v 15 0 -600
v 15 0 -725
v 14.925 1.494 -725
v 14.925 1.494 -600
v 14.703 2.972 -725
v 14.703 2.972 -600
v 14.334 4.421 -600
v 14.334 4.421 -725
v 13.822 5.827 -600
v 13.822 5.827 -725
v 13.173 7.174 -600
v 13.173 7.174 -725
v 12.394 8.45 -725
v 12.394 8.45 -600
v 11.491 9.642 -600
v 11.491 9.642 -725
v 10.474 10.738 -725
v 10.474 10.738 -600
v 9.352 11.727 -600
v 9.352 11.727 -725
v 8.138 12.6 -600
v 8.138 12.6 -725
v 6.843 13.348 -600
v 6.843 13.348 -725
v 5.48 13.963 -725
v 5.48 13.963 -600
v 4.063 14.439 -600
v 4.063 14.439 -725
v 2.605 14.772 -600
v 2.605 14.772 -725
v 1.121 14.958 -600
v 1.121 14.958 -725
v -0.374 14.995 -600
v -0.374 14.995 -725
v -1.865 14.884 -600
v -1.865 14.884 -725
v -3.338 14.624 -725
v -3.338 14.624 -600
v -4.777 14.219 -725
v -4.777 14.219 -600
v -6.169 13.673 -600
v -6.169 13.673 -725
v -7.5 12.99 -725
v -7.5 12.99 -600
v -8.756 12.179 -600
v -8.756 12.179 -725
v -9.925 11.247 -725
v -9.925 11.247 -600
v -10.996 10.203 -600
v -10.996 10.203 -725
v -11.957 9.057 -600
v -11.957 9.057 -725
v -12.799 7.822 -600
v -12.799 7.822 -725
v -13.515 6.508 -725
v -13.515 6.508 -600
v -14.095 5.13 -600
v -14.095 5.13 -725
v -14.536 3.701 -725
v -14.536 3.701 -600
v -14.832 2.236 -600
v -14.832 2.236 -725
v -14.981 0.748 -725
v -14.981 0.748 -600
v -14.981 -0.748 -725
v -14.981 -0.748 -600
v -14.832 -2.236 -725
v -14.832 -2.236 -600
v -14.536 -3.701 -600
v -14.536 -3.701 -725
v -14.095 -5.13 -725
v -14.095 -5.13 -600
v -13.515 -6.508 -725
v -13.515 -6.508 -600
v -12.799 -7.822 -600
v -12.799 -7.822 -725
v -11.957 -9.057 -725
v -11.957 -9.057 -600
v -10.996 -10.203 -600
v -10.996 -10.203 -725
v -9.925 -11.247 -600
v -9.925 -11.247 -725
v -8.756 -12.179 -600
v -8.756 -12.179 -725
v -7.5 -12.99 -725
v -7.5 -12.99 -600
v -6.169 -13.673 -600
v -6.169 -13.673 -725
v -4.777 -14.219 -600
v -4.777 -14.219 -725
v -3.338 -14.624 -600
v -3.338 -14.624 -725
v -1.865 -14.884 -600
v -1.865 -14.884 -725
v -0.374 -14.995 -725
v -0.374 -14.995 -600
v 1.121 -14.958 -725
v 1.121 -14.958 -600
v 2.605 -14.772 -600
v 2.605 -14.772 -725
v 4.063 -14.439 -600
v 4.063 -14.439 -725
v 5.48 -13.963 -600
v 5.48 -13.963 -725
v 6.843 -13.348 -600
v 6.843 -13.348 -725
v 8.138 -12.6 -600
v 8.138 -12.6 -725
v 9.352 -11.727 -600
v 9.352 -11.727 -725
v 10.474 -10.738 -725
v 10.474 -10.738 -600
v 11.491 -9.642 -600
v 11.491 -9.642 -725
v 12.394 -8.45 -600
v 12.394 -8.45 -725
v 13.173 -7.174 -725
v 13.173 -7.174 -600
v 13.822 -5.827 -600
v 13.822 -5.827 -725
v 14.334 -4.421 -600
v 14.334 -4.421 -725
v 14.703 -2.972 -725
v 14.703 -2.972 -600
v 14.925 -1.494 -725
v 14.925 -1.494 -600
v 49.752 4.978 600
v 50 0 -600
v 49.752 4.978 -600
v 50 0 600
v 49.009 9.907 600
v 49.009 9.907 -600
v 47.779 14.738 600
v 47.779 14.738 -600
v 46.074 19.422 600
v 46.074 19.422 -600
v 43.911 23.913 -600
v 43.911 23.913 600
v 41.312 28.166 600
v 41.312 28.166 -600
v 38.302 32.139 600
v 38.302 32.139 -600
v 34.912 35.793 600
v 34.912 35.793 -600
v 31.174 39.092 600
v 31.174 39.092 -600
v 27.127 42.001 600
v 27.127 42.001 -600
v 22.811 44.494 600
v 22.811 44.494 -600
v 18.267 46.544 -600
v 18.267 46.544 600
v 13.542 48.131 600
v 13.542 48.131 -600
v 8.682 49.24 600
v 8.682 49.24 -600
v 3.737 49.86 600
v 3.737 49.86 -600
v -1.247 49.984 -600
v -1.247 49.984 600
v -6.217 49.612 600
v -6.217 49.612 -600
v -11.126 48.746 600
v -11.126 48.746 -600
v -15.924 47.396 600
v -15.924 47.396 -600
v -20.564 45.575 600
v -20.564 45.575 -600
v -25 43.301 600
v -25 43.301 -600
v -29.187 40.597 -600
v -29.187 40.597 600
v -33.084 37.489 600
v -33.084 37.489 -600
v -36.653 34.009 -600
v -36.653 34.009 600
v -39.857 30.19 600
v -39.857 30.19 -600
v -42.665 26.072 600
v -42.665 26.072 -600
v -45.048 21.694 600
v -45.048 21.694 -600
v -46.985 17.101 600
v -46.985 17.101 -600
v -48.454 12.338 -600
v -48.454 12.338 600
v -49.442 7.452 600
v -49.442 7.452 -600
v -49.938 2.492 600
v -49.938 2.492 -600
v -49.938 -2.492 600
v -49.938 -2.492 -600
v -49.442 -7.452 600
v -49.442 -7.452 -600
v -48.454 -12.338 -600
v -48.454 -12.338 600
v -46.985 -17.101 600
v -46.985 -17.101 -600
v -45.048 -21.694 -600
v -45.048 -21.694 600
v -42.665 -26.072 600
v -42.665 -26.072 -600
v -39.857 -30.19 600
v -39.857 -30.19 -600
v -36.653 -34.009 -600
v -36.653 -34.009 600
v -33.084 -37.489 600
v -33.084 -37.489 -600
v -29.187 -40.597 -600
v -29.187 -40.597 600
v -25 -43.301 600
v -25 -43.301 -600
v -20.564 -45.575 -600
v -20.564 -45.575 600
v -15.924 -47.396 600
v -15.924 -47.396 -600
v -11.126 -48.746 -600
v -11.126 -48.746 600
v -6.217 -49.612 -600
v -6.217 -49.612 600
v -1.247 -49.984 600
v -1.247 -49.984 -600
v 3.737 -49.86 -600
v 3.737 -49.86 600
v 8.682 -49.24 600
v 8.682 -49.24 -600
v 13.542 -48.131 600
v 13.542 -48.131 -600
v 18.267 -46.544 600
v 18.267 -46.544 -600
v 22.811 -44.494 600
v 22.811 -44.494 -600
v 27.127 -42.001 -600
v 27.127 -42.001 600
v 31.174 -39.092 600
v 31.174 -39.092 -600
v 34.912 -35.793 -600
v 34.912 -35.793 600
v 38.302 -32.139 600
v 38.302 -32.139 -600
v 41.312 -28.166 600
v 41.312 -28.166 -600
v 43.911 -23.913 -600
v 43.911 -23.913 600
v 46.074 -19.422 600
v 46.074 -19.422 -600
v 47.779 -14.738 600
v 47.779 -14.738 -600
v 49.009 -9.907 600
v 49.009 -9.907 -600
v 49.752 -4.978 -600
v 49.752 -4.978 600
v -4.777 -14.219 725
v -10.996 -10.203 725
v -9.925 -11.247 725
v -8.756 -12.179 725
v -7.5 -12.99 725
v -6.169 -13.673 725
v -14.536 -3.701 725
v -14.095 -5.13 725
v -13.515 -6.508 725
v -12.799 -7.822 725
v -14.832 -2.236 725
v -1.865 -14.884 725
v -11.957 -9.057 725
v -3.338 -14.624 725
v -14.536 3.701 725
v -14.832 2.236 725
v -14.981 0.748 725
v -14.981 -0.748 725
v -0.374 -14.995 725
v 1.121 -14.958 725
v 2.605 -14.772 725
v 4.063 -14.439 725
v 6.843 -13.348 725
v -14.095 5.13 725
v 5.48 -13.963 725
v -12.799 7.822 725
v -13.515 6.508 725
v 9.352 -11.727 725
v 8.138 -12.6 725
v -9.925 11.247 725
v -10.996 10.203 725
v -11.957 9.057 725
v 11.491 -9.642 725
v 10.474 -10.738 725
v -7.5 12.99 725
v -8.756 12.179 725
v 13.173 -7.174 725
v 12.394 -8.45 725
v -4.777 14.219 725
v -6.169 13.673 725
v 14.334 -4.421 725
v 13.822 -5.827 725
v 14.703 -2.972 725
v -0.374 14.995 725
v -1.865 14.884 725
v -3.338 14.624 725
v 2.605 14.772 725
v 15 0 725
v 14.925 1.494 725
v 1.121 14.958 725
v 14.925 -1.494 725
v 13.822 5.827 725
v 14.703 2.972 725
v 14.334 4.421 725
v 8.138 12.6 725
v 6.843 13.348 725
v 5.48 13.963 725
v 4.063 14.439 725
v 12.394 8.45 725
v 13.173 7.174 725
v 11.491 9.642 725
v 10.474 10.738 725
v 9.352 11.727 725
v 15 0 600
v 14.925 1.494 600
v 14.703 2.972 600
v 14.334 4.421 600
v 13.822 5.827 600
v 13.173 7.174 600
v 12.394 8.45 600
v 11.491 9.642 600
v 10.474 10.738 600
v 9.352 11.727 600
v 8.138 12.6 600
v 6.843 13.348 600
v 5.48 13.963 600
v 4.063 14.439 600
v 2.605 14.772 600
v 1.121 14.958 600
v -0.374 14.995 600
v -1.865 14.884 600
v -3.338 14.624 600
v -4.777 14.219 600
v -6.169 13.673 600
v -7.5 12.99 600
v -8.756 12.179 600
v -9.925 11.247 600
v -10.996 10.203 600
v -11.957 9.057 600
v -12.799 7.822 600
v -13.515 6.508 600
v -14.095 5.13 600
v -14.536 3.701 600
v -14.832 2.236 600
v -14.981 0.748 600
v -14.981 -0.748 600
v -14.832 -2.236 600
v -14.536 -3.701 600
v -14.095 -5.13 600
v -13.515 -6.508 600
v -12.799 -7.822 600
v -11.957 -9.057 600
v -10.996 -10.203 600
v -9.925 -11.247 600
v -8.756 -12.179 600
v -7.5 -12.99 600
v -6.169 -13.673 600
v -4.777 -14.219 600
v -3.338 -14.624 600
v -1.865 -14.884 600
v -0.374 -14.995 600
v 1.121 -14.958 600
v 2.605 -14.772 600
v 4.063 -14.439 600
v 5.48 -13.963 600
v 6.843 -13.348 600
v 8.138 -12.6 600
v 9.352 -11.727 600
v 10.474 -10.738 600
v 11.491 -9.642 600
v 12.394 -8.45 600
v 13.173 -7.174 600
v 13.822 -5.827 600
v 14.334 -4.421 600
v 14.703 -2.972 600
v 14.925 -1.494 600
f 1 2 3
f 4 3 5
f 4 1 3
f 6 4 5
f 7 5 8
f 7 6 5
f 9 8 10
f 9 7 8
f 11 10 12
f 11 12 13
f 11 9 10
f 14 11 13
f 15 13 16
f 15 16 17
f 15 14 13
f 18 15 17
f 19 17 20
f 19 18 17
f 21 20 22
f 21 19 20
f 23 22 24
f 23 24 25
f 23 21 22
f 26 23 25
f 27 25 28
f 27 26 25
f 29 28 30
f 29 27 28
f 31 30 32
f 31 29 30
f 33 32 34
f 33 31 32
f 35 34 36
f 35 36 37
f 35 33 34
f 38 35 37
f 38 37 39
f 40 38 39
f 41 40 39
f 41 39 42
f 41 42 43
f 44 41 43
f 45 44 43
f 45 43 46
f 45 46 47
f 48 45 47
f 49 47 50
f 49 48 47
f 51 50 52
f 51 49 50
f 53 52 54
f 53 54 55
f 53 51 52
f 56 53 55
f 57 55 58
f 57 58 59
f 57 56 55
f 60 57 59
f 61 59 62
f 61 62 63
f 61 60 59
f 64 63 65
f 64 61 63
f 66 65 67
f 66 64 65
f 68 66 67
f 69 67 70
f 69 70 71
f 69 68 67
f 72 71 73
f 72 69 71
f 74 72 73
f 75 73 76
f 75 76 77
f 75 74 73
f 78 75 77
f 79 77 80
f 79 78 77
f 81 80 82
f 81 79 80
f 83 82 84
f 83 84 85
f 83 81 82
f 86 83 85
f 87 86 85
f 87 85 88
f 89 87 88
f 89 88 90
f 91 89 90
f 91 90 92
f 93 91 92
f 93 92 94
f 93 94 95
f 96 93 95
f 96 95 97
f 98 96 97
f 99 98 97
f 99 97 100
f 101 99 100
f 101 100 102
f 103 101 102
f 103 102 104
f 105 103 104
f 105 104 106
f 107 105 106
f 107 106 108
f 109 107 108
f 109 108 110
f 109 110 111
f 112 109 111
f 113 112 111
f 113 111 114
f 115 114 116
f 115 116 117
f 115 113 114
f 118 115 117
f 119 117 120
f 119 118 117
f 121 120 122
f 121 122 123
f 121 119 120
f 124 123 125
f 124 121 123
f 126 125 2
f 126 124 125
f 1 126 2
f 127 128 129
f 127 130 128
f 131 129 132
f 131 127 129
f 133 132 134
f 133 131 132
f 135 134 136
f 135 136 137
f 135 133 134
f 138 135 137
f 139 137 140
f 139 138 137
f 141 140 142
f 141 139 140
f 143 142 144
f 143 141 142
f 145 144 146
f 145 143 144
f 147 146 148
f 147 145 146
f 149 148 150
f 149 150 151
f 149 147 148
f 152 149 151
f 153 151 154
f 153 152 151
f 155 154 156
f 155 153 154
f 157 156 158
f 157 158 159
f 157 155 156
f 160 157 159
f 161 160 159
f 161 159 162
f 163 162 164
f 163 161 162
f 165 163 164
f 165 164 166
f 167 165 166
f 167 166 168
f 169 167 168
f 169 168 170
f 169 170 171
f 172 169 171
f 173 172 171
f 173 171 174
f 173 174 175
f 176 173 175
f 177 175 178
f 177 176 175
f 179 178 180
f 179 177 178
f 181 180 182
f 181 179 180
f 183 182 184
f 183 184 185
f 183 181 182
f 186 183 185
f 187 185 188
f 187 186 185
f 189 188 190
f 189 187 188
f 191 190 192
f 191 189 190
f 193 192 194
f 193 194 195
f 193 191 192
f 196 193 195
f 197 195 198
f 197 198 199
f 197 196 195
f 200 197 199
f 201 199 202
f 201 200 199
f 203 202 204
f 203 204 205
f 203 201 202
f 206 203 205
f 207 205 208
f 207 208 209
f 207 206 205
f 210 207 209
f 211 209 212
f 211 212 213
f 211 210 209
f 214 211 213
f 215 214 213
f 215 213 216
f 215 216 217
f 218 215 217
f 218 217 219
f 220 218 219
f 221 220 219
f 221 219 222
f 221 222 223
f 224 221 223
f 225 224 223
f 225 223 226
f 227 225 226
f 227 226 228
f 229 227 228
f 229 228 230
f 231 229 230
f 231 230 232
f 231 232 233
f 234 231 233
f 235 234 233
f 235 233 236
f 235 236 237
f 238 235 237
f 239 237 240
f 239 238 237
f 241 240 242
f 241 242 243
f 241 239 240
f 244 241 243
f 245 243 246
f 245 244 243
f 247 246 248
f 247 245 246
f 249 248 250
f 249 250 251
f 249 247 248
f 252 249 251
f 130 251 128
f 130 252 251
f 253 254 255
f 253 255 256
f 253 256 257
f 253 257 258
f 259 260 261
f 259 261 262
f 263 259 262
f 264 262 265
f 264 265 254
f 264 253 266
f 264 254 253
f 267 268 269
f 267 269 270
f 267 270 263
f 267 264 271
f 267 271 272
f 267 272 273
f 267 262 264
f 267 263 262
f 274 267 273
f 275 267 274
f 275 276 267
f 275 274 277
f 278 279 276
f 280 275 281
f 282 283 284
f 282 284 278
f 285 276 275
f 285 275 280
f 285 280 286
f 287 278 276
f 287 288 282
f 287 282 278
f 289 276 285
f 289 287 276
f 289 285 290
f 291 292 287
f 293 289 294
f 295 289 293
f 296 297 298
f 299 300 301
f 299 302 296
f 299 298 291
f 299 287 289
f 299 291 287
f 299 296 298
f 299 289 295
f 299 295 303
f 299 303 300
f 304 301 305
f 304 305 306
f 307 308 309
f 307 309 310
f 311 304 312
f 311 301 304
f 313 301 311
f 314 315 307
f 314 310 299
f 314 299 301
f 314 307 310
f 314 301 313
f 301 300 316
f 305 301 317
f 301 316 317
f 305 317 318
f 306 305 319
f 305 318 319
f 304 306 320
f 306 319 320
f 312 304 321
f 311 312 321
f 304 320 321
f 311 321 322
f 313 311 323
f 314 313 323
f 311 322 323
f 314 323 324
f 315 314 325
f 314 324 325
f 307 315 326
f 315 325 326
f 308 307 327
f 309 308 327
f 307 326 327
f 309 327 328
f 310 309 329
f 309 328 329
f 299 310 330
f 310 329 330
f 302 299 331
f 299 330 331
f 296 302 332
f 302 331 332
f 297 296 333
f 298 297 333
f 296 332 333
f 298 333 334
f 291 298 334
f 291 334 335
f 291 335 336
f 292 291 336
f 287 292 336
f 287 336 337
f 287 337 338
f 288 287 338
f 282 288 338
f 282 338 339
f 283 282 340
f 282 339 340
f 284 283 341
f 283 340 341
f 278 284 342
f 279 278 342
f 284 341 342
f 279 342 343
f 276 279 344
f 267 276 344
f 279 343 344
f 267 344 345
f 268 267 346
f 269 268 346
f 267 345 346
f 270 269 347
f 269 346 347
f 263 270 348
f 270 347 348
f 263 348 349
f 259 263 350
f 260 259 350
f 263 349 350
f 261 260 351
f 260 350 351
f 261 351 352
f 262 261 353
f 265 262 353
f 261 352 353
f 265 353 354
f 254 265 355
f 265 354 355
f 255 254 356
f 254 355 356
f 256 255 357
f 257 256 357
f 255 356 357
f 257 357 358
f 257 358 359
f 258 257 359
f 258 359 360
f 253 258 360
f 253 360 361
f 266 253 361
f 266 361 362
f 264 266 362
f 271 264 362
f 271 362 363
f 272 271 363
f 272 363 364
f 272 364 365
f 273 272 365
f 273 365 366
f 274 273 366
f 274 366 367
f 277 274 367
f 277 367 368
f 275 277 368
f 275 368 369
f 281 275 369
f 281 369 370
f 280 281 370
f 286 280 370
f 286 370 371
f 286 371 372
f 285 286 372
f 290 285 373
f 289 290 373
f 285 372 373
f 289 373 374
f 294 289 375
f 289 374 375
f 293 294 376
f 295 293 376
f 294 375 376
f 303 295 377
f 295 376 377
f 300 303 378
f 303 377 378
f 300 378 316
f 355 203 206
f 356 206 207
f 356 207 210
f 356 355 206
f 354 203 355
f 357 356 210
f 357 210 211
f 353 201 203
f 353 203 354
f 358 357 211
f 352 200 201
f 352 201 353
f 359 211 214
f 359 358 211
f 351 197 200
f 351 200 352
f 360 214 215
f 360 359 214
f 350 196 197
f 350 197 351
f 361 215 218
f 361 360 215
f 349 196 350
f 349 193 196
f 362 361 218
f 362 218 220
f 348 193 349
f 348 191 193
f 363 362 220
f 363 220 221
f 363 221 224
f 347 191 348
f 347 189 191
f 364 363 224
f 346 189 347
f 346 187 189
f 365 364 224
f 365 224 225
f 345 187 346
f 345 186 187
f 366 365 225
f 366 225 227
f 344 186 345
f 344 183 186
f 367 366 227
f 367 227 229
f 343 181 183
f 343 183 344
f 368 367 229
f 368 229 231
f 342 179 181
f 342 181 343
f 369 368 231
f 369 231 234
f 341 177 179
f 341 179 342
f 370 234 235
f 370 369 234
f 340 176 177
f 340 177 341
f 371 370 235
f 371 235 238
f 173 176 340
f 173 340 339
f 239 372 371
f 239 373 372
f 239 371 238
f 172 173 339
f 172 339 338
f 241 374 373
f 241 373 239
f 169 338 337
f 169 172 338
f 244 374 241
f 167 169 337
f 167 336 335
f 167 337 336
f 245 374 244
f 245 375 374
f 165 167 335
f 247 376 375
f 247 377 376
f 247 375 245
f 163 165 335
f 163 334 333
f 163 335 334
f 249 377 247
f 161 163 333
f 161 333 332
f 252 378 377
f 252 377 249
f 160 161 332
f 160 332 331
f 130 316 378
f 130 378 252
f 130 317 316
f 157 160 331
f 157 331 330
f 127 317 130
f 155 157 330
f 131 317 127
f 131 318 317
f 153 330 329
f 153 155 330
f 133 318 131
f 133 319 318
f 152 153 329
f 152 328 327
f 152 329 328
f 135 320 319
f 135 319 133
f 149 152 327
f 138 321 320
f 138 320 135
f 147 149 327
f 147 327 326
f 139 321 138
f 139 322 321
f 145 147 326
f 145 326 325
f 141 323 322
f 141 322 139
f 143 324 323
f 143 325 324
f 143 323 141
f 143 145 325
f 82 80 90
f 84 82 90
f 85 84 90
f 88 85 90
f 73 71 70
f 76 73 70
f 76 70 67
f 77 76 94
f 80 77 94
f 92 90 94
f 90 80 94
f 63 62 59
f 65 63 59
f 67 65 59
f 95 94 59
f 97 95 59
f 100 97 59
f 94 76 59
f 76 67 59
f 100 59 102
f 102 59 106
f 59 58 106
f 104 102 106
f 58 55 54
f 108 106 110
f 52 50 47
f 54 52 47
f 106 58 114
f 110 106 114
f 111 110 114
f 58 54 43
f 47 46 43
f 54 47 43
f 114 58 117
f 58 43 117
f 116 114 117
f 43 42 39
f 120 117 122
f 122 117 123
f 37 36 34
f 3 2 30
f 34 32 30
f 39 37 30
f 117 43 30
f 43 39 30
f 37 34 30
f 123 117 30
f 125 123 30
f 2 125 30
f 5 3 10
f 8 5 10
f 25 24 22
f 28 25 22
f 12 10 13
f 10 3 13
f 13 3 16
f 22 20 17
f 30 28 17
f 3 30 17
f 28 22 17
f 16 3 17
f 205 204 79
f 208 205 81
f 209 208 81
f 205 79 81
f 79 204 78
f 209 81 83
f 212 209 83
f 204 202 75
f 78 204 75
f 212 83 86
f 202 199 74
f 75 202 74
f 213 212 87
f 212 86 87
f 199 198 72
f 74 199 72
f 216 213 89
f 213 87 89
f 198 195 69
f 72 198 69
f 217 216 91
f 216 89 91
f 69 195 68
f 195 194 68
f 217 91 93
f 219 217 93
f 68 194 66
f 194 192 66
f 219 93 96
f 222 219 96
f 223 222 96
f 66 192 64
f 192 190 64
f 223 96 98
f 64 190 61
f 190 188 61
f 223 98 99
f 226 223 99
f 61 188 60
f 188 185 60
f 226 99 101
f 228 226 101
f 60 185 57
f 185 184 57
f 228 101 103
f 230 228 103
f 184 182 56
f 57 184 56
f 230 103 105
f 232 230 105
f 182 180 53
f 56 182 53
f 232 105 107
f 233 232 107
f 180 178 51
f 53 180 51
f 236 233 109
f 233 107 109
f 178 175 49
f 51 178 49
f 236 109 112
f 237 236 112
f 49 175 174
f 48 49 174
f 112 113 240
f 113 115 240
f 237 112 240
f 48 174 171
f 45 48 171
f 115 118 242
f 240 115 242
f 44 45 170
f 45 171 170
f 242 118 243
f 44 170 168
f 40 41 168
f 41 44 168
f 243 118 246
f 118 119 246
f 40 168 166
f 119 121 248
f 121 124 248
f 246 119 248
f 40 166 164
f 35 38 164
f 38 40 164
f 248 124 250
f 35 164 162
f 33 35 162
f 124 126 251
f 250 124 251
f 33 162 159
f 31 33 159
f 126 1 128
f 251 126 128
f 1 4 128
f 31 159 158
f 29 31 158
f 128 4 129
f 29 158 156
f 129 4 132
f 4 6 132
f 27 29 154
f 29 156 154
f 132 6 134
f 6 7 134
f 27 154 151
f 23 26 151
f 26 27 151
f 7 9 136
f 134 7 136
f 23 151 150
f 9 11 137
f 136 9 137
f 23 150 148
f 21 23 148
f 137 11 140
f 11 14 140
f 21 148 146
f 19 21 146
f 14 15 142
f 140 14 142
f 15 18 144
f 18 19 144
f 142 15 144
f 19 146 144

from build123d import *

# Parameters (mm, degrees)
SKETCH1_R           = 50
BOSS_EXTRUDE1_DEPTH = 600
BOSS_EXTRUDE2_DEPTH = 600
BOSS_EXTRUDE4_START = 600
SKETCH6_R           = 15
BOSS_EXTRUDE4_DEPTH = 125


with BuildPart() as part:
    # Sketch1 → Boss-Extrude1 (new, symmetric)
    with BuildSketch(Plane.XY):
        Circle(SKETCH1_R)
    extrude(amount=BOSS_EXTRUDE1_DEPTH, both=True)

    # Sketch4 → Boss-Extrude2 (add, symmetric)
    with BuildSketch(Plane.XY):
        with BuildLine():
            Line((-5, 18.3), (-5, 14.142135624))
            ThreePointArc((-5, 14.142135624), (0, -15), (5, 14.142135624))
            Line((5, 14.142135624), (5, 18.3))
            Line((5, 18.3), (-5, 18.3))
        make_face()
    extrude(amount=BOSS_EXTRUDE2_DEPTH, both=True)

    # Sketch6 → Boss-Extrude4 (add)
    with BuildSketch(Plane.XY.offset(BOSS_EXTRUDE4_START)):
        Circle(SKETCH6_R)
    boss_extrude4 = extrude(amount=BOSS_EXTRUDE4_DEPTH)

    # Mirror1: Boss-Extrude4 across plane
    add(boss_extrude4.mirror(Plane.XY))


solid = part.part
